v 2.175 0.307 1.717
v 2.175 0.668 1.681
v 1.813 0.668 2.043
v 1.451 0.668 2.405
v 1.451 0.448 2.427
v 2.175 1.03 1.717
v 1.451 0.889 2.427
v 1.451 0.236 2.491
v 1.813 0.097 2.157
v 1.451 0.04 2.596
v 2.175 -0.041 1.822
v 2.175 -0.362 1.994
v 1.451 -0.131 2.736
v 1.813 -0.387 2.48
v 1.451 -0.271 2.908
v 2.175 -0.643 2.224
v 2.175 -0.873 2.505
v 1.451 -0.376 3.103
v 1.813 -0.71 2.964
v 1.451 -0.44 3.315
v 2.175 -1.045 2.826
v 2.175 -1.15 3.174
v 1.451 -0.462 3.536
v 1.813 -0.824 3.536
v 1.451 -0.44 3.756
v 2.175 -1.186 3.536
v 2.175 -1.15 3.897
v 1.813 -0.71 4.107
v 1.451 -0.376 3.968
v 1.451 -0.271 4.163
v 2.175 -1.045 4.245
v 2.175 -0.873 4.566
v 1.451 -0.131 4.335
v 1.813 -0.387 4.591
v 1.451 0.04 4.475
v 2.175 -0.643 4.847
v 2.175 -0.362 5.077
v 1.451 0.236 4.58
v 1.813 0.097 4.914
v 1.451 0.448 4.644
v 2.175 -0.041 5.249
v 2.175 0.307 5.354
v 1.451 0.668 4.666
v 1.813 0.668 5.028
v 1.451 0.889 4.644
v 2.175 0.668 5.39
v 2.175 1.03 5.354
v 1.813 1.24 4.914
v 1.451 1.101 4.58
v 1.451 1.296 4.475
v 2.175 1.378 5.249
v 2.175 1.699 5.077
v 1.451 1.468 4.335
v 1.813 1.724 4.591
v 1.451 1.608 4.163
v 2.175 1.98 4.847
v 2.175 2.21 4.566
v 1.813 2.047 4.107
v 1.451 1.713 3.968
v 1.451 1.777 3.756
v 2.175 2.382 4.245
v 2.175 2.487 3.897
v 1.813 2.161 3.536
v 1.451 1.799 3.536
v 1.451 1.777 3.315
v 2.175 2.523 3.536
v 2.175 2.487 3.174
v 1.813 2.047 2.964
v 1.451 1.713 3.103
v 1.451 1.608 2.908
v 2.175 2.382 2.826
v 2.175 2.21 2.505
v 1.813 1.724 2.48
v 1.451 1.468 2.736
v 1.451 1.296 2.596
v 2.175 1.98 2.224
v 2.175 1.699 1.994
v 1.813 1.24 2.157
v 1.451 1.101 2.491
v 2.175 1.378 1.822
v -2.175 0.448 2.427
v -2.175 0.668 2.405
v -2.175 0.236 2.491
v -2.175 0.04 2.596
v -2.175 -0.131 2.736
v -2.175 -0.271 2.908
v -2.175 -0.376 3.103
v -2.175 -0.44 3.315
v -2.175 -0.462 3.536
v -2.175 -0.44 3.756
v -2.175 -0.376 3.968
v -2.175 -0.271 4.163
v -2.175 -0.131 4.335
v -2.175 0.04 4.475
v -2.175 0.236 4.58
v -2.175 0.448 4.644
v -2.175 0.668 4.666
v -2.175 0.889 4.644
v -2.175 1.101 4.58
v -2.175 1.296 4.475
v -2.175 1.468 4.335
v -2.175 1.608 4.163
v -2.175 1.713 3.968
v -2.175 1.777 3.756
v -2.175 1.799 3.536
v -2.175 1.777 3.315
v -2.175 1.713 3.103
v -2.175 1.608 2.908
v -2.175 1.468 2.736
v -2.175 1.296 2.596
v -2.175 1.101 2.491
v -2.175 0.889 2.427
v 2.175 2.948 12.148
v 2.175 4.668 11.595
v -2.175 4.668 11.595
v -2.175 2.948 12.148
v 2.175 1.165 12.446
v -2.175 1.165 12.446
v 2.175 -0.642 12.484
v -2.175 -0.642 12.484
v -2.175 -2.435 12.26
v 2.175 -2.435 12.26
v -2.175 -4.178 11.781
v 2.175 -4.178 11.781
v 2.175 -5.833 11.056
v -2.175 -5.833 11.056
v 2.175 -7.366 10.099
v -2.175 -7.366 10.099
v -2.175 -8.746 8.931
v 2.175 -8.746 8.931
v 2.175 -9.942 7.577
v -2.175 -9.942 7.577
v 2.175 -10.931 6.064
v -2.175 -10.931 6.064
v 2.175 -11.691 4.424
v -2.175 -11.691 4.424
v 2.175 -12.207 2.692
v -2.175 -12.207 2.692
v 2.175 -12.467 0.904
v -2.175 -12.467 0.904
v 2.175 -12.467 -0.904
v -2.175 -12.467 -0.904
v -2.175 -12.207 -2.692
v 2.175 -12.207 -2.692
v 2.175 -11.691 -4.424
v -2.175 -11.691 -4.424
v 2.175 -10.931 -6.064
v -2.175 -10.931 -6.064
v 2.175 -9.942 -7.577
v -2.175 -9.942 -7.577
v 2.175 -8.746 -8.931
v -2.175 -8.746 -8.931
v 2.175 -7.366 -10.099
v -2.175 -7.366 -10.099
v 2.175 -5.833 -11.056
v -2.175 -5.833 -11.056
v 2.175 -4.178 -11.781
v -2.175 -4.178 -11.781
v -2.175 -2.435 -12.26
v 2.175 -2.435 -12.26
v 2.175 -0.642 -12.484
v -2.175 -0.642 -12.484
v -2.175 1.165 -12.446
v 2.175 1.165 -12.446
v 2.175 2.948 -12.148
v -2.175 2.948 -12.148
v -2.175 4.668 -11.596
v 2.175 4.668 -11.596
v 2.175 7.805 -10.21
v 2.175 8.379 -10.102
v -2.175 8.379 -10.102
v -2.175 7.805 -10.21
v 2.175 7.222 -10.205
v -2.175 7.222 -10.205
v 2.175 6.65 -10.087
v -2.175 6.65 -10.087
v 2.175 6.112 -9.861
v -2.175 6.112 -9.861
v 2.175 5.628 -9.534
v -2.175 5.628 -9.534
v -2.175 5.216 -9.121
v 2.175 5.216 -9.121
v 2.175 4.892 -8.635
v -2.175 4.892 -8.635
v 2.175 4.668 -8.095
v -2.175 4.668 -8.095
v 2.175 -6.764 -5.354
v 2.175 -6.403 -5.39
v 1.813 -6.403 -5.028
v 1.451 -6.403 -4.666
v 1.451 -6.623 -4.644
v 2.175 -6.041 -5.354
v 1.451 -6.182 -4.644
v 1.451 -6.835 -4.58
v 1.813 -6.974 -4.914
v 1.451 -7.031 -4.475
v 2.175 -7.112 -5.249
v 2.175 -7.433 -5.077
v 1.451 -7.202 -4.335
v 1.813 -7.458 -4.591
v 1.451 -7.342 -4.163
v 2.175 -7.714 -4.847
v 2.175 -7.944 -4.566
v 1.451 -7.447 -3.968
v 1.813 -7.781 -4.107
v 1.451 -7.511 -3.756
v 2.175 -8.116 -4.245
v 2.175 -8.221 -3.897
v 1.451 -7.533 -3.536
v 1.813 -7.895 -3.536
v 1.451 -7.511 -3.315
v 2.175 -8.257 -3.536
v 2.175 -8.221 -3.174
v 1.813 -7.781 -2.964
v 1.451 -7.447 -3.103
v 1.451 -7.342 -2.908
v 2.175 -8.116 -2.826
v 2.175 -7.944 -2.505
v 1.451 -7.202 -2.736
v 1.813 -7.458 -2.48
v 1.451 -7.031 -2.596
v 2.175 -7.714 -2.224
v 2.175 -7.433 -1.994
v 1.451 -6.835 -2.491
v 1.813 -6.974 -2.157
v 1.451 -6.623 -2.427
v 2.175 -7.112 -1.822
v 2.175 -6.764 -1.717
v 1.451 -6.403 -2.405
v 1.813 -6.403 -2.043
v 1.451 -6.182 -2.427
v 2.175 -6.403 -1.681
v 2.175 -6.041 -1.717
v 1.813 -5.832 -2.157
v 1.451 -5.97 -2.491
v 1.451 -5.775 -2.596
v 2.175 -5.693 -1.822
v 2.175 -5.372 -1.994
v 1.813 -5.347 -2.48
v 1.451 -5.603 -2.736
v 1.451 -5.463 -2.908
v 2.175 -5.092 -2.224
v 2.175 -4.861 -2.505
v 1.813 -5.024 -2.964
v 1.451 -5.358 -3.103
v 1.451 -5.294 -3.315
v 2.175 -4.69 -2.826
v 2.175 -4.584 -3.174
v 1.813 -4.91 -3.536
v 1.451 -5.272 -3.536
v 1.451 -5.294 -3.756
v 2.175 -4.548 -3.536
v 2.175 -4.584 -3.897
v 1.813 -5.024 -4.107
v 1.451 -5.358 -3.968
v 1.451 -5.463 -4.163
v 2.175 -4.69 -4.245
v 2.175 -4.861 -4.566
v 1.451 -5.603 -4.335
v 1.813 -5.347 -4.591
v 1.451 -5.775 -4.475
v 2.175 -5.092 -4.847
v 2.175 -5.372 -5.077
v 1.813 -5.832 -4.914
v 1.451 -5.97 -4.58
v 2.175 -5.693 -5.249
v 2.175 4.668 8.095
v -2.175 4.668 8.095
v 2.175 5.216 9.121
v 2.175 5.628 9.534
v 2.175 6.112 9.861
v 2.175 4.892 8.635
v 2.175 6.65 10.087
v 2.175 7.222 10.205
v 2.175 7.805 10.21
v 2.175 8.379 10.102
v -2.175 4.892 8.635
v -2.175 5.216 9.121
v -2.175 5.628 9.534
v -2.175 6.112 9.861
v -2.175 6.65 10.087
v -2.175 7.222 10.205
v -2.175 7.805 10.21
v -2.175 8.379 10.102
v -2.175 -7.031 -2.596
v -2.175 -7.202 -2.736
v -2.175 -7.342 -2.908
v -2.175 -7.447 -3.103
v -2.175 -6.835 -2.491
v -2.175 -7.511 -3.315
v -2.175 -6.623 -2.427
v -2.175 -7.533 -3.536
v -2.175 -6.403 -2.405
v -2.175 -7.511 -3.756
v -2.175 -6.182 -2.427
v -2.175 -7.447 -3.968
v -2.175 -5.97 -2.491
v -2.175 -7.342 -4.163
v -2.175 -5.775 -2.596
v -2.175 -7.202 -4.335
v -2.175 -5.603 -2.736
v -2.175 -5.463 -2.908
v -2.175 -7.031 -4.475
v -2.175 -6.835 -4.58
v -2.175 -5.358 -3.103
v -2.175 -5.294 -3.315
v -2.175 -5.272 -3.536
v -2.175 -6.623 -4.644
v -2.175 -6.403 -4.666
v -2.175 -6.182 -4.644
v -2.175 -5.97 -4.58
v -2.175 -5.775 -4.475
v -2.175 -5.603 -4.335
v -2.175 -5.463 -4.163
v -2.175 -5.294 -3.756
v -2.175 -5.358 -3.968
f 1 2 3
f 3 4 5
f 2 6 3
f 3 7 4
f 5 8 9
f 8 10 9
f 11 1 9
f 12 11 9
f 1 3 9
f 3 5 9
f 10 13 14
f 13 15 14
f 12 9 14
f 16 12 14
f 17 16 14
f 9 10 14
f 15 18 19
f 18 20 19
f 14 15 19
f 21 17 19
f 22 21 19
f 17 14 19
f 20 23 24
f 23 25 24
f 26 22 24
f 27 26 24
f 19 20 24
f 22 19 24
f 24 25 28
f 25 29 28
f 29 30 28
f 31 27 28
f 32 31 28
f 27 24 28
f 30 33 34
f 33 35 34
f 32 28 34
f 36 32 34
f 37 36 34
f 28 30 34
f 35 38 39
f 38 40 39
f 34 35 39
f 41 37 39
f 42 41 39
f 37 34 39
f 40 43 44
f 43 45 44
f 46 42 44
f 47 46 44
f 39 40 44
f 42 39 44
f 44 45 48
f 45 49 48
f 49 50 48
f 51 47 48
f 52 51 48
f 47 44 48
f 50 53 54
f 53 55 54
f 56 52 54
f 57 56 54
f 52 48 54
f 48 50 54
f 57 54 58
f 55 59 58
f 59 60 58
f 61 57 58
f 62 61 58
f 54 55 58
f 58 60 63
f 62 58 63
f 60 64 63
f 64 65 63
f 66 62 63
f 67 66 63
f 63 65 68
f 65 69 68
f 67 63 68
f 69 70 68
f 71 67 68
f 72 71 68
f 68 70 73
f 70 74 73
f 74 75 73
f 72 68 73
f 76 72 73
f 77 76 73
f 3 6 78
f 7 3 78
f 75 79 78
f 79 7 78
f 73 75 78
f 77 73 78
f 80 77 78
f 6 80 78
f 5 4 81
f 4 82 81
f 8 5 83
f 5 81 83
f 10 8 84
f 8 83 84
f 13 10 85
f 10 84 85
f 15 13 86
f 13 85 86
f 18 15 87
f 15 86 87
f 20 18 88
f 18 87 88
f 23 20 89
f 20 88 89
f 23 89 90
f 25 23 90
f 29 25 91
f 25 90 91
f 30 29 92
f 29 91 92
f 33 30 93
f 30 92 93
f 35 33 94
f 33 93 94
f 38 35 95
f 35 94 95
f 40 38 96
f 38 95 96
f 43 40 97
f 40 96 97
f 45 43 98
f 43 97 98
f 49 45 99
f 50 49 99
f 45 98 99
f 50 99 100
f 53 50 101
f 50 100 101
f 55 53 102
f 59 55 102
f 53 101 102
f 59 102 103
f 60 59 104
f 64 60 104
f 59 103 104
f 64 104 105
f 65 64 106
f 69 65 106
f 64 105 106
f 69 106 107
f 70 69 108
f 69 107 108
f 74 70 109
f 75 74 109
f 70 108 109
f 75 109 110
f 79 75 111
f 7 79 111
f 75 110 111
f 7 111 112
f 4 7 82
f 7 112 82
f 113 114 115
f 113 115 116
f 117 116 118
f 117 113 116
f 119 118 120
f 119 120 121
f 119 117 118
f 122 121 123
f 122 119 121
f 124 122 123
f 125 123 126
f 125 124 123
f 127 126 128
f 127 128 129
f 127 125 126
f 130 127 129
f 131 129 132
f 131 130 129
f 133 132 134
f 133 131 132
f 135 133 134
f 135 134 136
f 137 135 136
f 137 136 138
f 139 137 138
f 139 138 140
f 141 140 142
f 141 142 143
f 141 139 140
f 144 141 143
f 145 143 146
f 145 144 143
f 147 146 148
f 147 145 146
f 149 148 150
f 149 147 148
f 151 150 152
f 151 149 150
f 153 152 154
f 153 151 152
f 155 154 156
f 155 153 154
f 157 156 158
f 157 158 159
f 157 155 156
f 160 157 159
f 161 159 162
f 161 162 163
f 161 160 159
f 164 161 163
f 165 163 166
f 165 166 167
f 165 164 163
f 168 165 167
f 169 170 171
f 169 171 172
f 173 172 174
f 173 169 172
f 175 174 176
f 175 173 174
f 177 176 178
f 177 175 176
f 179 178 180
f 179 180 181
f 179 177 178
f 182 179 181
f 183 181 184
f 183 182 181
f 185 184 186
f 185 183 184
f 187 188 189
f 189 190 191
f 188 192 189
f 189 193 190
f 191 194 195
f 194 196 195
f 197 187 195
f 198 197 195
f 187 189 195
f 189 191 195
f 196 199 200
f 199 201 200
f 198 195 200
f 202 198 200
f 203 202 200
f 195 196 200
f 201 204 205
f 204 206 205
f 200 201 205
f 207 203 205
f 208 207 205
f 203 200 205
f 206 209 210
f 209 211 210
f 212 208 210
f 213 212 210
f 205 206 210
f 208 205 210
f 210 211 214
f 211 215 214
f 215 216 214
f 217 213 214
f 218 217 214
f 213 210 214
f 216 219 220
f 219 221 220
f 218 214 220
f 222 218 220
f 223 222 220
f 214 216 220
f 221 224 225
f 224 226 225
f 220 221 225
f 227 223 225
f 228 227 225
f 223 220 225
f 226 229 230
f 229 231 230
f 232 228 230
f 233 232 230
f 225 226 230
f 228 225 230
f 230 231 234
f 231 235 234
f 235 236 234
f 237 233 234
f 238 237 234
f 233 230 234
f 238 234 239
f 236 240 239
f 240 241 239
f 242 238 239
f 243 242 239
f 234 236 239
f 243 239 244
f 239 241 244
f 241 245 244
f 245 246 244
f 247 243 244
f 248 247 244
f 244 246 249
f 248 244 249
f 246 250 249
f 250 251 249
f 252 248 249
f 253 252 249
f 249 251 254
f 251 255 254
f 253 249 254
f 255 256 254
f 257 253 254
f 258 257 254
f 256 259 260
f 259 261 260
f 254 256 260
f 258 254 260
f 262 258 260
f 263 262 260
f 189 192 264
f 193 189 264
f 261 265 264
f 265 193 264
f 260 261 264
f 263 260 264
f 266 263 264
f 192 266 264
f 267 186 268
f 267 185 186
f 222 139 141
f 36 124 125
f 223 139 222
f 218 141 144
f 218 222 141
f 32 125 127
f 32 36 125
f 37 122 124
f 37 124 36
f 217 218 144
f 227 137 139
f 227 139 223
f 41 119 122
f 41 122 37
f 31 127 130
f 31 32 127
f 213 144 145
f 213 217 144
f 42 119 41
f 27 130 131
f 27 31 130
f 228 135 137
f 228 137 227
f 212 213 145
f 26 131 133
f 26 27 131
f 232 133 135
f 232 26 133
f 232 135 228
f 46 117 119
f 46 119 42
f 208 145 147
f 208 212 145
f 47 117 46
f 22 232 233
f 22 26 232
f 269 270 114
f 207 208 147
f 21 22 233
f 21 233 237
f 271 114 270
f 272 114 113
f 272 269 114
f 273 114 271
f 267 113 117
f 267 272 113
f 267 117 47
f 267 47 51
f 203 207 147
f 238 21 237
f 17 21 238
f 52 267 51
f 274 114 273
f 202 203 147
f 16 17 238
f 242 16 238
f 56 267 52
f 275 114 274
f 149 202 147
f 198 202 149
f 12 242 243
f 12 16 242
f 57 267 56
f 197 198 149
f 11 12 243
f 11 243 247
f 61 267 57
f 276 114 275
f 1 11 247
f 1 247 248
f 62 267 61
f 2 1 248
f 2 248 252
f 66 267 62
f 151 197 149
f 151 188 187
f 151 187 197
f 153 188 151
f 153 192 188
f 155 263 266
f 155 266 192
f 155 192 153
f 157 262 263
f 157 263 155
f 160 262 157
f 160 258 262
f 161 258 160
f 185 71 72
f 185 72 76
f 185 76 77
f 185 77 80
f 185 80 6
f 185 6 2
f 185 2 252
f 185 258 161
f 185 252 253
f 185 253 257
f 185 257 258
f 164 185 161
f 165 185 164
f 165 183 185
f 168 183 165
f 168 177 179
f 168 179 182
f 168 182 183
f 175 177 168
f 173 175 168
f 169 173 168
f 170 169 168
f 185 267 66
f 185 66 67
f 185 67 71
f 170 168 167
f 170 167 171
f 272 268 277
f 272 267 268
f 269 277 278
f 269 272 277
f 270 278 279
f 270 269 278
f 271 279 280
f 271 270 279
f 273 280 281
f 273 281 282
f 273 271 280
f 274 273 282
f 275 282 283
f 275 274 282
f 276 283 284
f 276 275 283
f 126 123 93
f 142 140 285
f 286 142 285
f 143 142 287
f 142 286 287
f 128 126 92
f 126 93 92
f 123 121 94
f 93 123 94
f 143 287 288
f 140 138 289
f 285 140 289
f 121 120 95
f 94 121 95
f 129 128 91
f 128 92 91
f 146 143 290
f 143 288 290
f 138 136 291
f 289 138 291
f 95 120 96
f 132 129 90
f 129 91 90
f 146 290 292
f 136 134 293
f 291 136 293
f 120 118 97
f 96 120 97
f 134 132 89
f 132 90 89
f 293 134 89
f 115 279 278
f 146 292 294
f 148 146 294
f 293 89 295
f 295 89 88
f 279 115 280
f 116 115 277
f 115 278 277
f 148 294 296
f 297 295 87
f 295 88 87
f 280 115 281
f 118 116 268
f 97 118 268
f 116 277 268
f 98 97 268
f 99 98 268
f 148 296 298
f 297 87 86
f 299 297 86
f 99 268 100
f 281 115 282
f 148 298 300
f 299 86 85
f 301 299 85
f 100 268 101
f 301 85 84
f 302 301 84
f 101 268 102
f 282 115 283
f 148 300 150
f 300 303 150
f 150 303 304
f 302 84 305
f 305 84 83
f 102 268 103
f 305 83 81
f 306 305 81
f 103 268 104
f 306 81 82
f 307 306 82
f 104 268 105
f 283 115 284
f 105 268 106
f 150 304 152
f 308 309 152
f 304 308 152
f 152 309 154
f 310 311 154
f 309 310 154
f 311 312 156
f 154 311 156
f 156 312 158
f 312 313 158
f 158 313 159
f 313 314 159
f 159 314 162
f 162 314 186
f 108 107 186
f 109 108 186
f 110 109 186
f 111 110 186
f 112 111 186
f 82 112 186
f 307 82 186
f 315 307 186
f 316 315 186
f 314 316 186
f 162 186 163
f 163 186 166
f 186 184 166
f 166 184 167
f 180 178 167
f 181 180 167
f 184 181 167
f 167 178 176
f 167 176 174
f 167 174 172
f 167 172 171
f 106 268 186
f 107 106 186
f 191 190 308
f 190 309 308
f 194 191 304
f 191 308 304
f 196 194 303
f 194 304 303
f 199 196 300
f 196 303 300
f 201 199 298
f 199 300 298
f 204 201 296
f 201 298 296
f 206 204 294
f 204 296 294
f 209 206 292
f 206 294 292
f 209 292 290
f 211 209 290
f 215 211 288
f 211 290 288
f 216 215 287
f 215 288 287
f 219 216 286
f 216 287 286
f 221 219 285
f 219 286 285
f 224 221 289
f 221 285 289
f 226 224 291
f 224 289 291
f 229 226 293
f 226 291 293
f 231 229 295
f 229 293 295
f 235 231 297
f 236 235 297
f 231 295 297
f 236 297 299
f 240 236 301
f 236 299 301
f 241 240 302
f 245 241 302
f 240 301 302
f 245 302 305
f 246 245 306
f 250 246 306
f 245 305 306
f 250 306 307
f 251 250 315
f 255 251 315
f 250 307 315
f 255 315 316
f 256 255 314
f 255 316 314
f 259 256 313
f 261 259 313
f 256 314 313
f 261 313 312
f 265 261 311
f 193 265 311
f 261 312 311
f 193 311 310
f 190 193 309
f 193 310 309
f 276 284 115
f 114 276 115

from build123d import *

# Parameters (mm, degrees)
BOSS_EXTRUDE1_DEPTH             = 2.175
F_2_CLEARANCE_HOLE2_D           = 2.2606
F_2_CLEARANCE_HOLE2_CSINK_D     = 3.7084
F_2_CLEARANCE_HOLE2_CSINK_ANGLE = 90


with BuildPart() as part:
    # Sketch1 → Boss-Extrude1 (new, symmetric)
    with BuildSketch(Plane(origin=(0, 0, 0), x_dir=(0, 0, -1), z_dir=(1, 0, 0))):
        with BuildLine():
            Line((-10.101597565, 8.379005111), (-11.5955, 4.668445111))
            ThreePointArc((-11.5955, 4.668445111), (0, -12.5), (11.5955, 4.668445111))
            Line((11.5955, 4.668445111), (10.101597565, 8.379005111))
            ThreePointArc((10.101597565, 8.379005111), (9.860779562, 6.11162847), (8.0955, 4.668445111))
            Line((8.0955, 4.668445111), (-8.0955, 4.668445111))
            ThreePointArc((-8.0955, 4.668445111), (-9.860779562, 6.11162847), (-10.101597565, 8.379005111))
        make_face()
    extrude(amount=BOSS_EXTRUDE1_DEPTH, both=True)

    # #2 Clearance Hole2 (through all)
    with Locations(Plane(origin=(2.175, 0.668445111, 3.535533906), x_dir=(0, 0, 1), z_dir=(1, 0, 0))):
        with Locations((0, 0), (-7.071067812, 7.071067812)):
            CounterSinkHole(F_2_CLEARANCE_HOLE2_D / 2, F_2_CLEARANCE_HOLE2_CSINK_D / 2, counter_sink_angle=F_2_CLEARANCE_HOLE2_CSINK_ANGLE)


solid = part.part
